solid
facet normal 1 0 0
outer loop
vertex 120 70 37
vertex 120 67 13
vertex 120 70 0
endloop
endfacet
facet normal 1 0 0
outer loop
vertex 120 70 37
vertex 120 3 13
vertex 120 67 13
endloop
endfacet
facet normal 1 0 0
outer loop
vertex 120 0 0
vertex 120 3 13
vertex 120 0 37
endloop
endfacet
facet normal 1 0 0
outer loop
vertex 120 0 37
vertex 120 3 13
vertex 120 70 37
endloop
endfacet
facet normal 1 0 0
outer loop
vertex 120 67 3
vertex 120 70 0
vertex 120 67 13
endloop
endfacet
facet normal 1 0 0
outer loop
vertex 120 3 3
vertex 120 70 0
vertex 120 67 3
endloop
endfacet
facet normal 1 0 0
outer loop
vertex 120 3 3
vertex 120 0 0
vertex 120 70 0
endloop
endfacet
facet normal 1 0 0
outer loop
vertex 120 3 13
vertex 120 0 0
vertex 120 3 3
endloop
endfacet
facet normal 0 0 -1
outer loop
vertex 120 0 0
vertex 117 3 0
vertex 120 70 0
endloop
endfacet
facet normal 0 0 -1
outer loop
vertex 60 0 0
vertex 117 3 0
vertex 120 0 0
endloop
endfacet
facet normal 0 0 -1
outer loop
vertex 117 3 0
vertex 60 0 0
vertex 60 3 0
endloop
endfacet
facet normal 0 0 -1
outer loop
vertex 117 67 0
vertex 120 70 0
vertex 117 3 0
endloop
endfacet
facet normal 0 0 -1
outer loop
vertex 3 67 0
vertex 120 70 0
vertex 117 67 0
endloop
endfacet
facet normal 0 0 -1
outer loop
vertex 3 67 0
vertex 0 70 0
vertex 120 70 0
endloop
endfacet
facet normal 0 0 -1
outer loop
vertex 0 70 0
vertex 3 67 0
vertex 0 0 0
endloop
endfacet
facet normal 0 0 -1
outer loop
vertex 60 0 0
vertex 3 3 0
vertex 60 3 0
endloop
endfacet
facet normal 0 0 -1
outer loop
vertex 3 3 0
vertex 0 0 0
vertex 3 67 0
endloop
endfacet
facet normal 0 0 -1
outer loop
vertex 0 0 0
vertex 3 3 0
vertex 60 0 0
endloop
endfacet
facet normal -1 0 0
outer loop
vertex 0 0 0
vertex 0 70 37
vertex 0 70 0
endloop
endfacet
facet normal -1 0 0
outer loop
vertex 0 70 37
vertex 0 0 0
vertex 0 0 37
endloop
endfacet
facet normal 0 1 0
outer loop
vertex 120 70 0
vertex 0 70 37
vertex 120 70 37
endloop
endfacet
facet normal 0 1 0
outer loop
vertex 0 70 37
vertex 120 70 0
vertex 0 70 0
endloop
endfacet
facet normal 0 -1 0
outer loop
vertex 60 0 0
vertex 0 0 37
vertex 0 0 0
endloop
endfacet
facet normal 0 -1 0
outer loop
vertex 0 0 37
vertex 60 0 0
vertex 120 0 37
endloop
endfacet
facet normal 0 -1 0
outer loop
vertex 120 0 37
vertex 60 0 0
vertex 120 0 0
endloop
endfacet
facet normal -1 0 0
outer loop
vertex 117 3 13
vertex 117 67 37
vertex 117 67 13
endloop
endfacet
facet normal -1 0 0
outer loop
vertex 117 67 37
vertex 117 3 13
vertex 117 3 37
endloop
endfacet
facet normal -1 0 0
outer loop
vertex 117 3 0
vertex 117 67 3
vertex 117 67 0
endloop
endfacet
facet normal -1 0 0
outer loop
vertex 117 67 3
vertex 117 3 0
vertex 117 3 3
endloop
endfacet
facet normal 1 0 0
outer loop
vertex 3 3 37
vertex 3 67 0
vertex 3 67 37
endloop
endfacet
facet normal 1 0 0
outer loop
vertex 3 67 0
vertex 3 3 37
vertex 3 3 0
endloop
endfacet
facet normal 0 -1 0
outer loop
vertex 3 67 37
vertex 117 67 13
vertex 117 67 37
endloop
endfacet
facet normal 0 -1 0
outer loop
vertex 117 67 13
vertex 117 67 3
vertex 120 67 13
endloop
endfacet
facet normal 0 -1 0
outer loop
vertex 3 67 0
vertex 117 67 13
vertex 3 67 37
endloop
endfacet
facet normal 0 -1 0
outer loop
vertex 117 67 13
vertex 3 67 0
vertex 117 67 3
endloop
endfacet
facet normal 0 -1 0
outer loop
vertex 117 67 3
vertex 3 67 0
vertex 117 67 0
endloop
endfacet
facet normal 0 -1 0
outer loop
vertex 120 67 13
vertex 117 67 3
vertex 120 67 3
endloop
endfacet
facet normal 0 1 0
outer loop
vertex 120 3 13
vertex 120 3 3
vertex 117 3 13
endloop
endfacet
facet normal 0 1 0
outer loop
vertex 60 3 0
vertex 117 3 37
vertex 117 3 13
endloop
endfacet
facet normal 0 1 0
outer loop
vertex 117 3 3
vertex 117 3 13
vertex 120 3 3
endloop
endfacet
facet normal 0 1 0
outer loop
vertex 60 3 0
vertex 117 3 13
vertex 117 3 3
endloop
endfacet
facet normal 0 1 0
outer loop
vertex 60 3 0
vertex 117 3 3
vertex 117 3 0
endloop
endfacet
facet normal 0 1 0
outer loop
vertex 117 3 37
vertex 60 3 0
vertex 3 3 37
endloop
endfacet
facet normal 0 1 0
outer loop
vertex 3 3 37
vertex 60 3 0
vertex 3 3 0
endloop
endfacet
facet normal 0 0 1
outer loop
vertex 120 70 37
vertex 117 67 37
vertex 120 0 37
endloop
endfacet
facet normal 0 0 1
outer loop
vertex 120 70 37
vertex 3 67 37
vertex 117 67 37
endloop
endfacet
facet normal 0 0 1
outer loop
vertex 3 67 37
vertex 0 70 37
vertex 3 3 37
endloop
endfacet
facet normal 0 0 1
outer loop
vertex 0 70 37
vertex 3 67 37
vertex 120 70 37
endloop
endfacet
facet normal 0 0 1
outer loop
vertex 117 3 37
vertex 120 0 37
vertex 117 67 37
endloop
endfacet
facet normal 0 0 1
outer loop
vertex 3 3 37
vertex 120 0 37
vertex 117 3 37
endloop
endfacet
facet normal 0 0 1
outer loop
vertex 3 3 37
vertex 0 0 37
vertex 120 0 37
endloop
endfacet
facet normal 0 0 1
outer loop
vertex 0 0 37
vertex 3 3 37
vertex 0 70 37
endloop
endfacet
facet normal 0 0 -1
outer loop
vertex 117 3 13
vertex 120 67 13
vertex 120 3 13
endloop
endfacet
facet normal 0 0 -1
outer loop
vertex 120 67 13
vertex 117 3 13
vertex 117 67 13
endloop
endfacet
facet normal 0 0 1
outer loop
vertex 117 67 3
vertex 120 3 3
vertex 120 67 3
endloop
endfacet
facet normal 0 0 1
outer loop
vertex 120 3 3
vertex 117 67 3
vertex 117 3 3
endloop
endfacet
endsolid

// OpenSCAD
// Reservoir - a rectangular open-top tank with a raised floor that creates two
// buffer chambers and a solid gel-tray platform in between. The two chambers
// connect above the platform. This is the part the user measured with calipers.
//

L     = 120;
W     = 70;
H     = 40;
wall  = 3;
floor = 3;
plat  = 60;
plat_h = 10;
anod  = 2;

$fn = 64;

inner_w = W - 2 * wall;
inner_h = H - floor;

difference() {
    cube([L, W, H]);
    translate([wall, wall, floor]) cube([L - 2 * wall, W - 2 * wall, H - floor]);     // hollow, open top
    translate([0, 0, H - wall]) cube([L, W, wall]);                                    // top rim
    translate([wall, wall, 0]) cube([L - 2 * wall, W - 2 * wall, floor]);              // floor
    translate([plat, wall, floor]) cube([plat, W - 2 * wall, plat_h]);                 // gel platform
    for (x = [-L / 2, L / 2])
        translate([x, 0, -1]) rotate([-90, 0, 0]) cylinder(h = H + 2, d = anod);      // electrode holes
}
